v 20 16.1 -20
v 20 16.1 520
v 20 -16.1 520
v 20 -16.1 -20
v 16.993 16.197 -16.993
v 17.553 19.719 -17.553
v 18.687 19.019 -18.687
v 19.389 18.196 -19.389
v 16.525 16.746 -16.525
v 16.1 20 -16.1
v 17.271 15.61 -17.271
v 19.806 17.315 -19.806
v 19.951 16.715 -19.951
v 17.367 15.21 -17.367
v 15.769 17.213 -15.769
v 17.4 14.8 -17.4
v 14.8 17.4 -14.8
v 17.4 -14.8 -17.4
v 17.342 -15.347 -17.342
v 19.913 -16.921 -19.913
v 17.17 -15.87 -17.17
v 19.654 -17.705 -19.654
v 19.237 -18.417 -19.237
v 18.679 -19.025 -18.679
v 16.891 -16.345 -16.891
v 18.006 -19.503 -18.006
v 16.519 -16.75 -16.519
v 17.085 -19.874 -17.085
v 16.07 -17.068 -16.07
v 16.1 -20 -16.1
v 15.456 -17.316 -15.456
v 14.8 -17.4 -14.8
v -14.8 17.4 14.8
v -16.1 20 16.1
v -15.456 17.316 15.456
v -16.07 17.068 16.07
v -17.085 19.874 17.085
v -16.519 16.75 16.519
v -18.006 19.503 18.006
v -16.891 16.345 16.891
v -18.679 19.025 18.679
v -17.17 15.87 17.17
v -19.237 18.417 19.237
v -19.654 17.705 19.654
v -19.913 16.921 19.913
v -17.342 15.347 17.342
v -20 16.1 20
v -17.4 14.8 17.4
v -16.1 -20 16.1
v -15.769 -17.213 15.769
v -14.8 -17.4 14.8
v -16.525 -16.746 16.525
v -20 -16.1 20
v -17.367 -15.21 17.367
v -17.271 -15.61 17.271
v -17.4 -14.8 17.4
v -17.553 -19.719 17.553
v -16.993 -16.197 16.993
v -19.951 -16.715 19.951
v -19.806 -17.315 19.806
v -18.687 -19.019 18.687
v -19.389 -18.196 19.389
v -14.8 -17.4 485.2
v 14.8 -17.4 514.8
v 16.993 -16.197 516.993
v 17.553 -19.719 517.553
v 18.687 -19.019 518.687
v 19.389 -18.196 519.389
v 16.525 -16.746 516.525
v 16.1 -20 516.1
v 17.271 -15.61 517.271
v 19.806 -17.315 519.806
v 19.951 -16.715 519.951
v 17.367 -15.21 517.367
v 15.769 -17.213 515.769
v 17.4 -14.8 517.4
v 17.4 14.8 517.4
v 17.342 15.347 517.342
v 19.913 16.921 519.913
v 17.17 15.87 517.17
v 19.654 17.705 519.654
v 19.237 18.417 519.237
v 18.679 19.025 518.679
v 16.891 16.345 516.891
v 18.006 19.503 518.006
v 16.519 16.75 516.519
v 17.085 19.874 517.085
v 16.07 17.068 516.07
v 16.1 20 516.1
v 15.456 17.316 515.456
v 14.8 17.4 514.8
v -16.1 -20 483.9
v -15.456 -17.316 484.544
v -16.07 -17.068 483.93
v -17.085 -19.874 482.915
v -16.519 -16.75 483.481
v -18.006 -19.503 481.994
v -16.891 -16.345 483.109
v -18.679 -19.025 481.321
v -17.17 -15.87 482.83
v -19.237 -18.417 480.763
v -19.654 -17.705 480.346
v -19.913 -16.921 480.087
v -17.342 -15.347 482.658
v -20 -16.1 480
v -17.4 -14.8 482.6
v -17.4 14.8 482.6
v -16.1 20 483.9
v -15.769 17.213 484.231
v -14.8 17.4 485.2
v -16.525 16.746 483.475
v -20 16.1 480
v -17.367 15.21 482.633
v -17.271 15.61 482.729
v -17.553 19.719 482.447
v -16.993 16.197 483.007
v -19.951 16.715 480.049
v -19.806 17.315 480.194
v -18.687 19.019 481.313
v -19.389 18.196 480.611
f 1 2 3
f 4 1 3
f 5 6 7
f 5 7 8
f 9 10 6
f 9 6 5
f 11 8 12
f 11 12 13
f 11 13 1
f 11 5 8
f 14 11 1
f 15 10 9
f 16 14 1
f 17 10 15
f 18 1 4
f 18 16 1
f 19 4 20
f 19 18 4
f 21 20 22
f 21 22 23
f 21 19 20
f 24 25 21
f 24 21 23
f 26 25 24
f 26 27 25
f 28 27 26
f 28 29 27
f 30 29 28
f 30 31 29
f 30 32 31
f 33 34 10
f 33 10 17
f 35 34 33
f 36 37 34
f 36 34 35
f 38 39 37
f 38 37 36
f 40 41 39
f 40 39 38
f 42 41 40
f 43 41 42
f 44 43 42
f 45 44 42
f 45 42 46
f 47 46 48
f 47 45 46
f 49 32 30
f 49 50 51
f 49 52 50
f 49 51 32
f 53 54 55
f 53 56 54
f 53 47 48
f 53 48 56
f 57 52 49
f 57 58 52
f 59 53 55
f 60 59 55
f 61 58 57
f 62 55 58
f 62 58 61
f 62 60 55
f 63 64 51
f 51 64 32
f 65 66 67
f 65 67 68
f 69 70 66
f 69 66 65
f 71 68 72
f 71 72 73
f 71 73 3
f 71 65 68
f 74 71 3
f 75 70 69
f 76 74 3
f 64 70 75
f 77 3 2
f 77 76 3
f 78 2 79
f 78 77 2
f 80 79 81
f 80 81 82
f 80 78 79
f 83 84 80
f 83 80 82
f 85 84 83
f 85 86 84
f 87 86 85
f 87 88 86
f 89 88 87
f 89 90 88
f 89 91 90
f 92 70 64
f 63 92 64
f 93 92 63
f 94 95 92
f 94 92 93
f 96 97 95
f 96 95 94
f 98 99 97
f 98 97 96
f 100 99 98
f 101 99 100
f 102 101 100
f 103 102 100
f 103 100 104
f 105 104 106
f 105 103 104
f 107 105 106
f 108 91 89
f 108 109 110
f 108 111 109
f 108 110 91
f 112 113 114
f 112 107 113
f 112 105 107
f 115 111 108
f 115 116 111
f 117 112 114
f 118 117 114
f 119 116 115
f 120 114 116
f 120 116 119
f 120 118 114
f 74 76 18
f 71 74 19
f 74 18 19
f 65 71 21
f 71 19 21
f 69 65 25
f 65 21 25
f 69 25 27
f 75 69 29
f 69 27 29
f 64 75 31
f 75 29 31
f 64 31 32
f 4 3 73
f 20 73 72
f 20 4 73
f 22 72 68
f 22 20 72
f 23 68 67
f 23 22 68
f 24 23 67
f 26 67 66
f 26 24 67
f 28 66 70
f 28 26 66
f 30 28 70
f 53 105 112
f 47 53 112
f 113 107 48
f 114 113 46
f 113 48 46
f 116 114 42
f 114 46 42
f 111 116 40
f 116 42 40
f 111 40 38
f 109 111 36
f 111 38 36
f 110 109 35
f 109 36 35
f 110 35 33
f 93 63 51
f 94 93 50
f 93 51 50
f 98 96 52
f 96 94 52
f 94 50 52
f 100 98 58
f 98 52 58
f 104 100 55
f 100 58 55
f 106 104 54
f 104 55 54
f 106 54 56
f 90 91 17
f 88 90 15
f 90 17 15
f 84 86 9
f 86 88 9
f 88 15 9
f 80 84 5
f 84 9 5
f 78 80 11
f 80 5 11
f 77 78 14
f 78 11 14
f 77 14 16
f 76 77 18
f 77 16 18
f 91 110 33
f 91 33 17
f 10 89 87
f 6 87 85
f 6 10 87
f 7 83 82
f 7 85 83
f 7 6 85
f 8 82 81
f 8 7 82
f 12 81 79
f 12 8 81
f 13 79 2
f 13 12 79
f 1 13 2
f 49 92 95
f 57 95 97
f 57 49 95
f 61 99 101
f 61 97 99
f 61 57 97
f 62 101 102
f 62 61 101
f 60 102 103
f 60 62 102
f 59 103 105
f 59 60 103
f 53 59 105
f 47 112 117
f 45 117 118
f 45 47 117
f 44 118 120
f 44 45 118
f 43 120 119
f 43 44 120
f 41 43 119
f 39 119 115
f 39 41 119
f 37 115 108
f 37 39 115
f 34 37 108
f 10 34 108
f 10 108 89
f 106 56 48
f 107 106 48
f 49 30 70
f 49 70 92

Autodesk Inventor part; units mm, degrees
ref_plane "Start plane" through (0, 0, -20) normal (0, 0, 1) x (1, 0, 0)
ref_plane "End plane" through (0, 0, 520) normal (0, 0, 1) x (1, 0, 0)
sketch "Sketch" plane through (0, 0, 0) normal (0, 0, 1) x (1, 0, 0)
  line L0 (-20, -16.1) -> (-20, 16.1)
  line L1 (-16.1, 20) -> (16.1, 20)
  line L2 (20, 16.1) -> (20, -16.1)
  line L3 (16.1, -20) -> (-16.1, -20)
  arc A0 (-20, -16.1) -> (-16.1, -20) centre (-16.1, -16.1) ccw
  arc A1 (-16.1, 20) -> (-20, 16.1) centre (-16.1, 16.1) ccw
  arc A2 (20, 16.1) -> (16.1, 20) centre (16.1, 16.1) ccw
  arc A3 (16.1, -20) -> (20, -16.1) centre (16.1, -16.1) ccw
  line L4 (-14.8, 17.4) -> (14.8, 17.4)
  line L5 (17.4, 14.8) -> (17.4, -14.8)
  line L6 (14.8, -17.4) -> (-14.8, -17.4)
  line L7 (-17.4, -14.8) -> (-17.4, 14.8)
  line L8 (0, 29.1308) -> (0, -29.1308) construction
  line L9 (-29.1308, 0) -> (29.1308, 0) construction
  arc A4 (-17.4, -14.8) -> (-14.8, -17.4) centre (-14.8, -14.8) ccw
  arc A5 (-14.8, 17.4) -> (-17.4, 14.8) centre (-14.8, 14.8) ccw
  arc A6 (17.4, 14.8) -> (14.8, 17.4) centre (14.8, 14.8) ccw
  arc A7 (14.8, -17.4) -> (17.4, -14.8) centre (14.8, -14.8) ccw
  dimension "d7" = 3.9
  dimension "d10" = 40
  dimension "d11" = 40
  dimension "d12" = 2.6
  dimension "d15" = 20
  dimension "d16" = 20
  dimension "d19" = 2.6
  dimension "d20" = 2.6
extrude "Body" add sketch "Sketch" along normal up to surface (540 mm away) from surface at -20
sketch "Sketch3" plane through (0, 0, 0) normal (0, 0, 1) x (1, 0, 0)
  line L0 (0, 0) -> (10, 0)
ref_plane "Work Plane3" through (0, 0, 0) normal (0, -1, 0) x (1, 0, 0)
sketch "Sketch4" plane through (0, 0, 0) normal (0, -1, 0) x (1, 0, 0)
  line L0 (-2, -20) -> (12, -20)
  line L1 (-2, 520) -> (12, 520)
  dimension "d18" = 540
ref_plane "Work Plane4" through (20, 0, 520) normal (-0.7071, 0, 0.7071) x (0.7071, 0, 0.7071)
split "Split1" plane through (20, 0, 520) removes the side toward (-0.7071, 0, 0.7071)
ref_plane "Work Plane5" through (20, 0, -20) normal (-0.7071, 0, -0.7071) x (-0.7071, 0, 0.7071)
split "Split2" plane through (20, 0, -20) removes the side toward (-0.7071, 0, -0.7071)
equation "\"d7\" = G_IR"
equation "\"d10\" = G_H"
equation "\"d11\" = G_W"
equation "\"d12\" = G_T"
equation "\"d15\" = 0.5 * d10"
equation "\"d16\" = 0.5 * d11"
equation "\"d19\" = G_T"
equation "\"d20\" = G_T"
equation "\"d3\" = G_L"
equation "\"G_W\" = 40"
equation "\"G_H\" = 40"
equation "\"G_T\" = 2.6"
equation "\"G_IR\" = 3.9"
equation "\"G_L\" = d18"
properties part number "EN 10210-2 - 40 x 40 x 2.6 - 540" material "Steel, Galvanized"
